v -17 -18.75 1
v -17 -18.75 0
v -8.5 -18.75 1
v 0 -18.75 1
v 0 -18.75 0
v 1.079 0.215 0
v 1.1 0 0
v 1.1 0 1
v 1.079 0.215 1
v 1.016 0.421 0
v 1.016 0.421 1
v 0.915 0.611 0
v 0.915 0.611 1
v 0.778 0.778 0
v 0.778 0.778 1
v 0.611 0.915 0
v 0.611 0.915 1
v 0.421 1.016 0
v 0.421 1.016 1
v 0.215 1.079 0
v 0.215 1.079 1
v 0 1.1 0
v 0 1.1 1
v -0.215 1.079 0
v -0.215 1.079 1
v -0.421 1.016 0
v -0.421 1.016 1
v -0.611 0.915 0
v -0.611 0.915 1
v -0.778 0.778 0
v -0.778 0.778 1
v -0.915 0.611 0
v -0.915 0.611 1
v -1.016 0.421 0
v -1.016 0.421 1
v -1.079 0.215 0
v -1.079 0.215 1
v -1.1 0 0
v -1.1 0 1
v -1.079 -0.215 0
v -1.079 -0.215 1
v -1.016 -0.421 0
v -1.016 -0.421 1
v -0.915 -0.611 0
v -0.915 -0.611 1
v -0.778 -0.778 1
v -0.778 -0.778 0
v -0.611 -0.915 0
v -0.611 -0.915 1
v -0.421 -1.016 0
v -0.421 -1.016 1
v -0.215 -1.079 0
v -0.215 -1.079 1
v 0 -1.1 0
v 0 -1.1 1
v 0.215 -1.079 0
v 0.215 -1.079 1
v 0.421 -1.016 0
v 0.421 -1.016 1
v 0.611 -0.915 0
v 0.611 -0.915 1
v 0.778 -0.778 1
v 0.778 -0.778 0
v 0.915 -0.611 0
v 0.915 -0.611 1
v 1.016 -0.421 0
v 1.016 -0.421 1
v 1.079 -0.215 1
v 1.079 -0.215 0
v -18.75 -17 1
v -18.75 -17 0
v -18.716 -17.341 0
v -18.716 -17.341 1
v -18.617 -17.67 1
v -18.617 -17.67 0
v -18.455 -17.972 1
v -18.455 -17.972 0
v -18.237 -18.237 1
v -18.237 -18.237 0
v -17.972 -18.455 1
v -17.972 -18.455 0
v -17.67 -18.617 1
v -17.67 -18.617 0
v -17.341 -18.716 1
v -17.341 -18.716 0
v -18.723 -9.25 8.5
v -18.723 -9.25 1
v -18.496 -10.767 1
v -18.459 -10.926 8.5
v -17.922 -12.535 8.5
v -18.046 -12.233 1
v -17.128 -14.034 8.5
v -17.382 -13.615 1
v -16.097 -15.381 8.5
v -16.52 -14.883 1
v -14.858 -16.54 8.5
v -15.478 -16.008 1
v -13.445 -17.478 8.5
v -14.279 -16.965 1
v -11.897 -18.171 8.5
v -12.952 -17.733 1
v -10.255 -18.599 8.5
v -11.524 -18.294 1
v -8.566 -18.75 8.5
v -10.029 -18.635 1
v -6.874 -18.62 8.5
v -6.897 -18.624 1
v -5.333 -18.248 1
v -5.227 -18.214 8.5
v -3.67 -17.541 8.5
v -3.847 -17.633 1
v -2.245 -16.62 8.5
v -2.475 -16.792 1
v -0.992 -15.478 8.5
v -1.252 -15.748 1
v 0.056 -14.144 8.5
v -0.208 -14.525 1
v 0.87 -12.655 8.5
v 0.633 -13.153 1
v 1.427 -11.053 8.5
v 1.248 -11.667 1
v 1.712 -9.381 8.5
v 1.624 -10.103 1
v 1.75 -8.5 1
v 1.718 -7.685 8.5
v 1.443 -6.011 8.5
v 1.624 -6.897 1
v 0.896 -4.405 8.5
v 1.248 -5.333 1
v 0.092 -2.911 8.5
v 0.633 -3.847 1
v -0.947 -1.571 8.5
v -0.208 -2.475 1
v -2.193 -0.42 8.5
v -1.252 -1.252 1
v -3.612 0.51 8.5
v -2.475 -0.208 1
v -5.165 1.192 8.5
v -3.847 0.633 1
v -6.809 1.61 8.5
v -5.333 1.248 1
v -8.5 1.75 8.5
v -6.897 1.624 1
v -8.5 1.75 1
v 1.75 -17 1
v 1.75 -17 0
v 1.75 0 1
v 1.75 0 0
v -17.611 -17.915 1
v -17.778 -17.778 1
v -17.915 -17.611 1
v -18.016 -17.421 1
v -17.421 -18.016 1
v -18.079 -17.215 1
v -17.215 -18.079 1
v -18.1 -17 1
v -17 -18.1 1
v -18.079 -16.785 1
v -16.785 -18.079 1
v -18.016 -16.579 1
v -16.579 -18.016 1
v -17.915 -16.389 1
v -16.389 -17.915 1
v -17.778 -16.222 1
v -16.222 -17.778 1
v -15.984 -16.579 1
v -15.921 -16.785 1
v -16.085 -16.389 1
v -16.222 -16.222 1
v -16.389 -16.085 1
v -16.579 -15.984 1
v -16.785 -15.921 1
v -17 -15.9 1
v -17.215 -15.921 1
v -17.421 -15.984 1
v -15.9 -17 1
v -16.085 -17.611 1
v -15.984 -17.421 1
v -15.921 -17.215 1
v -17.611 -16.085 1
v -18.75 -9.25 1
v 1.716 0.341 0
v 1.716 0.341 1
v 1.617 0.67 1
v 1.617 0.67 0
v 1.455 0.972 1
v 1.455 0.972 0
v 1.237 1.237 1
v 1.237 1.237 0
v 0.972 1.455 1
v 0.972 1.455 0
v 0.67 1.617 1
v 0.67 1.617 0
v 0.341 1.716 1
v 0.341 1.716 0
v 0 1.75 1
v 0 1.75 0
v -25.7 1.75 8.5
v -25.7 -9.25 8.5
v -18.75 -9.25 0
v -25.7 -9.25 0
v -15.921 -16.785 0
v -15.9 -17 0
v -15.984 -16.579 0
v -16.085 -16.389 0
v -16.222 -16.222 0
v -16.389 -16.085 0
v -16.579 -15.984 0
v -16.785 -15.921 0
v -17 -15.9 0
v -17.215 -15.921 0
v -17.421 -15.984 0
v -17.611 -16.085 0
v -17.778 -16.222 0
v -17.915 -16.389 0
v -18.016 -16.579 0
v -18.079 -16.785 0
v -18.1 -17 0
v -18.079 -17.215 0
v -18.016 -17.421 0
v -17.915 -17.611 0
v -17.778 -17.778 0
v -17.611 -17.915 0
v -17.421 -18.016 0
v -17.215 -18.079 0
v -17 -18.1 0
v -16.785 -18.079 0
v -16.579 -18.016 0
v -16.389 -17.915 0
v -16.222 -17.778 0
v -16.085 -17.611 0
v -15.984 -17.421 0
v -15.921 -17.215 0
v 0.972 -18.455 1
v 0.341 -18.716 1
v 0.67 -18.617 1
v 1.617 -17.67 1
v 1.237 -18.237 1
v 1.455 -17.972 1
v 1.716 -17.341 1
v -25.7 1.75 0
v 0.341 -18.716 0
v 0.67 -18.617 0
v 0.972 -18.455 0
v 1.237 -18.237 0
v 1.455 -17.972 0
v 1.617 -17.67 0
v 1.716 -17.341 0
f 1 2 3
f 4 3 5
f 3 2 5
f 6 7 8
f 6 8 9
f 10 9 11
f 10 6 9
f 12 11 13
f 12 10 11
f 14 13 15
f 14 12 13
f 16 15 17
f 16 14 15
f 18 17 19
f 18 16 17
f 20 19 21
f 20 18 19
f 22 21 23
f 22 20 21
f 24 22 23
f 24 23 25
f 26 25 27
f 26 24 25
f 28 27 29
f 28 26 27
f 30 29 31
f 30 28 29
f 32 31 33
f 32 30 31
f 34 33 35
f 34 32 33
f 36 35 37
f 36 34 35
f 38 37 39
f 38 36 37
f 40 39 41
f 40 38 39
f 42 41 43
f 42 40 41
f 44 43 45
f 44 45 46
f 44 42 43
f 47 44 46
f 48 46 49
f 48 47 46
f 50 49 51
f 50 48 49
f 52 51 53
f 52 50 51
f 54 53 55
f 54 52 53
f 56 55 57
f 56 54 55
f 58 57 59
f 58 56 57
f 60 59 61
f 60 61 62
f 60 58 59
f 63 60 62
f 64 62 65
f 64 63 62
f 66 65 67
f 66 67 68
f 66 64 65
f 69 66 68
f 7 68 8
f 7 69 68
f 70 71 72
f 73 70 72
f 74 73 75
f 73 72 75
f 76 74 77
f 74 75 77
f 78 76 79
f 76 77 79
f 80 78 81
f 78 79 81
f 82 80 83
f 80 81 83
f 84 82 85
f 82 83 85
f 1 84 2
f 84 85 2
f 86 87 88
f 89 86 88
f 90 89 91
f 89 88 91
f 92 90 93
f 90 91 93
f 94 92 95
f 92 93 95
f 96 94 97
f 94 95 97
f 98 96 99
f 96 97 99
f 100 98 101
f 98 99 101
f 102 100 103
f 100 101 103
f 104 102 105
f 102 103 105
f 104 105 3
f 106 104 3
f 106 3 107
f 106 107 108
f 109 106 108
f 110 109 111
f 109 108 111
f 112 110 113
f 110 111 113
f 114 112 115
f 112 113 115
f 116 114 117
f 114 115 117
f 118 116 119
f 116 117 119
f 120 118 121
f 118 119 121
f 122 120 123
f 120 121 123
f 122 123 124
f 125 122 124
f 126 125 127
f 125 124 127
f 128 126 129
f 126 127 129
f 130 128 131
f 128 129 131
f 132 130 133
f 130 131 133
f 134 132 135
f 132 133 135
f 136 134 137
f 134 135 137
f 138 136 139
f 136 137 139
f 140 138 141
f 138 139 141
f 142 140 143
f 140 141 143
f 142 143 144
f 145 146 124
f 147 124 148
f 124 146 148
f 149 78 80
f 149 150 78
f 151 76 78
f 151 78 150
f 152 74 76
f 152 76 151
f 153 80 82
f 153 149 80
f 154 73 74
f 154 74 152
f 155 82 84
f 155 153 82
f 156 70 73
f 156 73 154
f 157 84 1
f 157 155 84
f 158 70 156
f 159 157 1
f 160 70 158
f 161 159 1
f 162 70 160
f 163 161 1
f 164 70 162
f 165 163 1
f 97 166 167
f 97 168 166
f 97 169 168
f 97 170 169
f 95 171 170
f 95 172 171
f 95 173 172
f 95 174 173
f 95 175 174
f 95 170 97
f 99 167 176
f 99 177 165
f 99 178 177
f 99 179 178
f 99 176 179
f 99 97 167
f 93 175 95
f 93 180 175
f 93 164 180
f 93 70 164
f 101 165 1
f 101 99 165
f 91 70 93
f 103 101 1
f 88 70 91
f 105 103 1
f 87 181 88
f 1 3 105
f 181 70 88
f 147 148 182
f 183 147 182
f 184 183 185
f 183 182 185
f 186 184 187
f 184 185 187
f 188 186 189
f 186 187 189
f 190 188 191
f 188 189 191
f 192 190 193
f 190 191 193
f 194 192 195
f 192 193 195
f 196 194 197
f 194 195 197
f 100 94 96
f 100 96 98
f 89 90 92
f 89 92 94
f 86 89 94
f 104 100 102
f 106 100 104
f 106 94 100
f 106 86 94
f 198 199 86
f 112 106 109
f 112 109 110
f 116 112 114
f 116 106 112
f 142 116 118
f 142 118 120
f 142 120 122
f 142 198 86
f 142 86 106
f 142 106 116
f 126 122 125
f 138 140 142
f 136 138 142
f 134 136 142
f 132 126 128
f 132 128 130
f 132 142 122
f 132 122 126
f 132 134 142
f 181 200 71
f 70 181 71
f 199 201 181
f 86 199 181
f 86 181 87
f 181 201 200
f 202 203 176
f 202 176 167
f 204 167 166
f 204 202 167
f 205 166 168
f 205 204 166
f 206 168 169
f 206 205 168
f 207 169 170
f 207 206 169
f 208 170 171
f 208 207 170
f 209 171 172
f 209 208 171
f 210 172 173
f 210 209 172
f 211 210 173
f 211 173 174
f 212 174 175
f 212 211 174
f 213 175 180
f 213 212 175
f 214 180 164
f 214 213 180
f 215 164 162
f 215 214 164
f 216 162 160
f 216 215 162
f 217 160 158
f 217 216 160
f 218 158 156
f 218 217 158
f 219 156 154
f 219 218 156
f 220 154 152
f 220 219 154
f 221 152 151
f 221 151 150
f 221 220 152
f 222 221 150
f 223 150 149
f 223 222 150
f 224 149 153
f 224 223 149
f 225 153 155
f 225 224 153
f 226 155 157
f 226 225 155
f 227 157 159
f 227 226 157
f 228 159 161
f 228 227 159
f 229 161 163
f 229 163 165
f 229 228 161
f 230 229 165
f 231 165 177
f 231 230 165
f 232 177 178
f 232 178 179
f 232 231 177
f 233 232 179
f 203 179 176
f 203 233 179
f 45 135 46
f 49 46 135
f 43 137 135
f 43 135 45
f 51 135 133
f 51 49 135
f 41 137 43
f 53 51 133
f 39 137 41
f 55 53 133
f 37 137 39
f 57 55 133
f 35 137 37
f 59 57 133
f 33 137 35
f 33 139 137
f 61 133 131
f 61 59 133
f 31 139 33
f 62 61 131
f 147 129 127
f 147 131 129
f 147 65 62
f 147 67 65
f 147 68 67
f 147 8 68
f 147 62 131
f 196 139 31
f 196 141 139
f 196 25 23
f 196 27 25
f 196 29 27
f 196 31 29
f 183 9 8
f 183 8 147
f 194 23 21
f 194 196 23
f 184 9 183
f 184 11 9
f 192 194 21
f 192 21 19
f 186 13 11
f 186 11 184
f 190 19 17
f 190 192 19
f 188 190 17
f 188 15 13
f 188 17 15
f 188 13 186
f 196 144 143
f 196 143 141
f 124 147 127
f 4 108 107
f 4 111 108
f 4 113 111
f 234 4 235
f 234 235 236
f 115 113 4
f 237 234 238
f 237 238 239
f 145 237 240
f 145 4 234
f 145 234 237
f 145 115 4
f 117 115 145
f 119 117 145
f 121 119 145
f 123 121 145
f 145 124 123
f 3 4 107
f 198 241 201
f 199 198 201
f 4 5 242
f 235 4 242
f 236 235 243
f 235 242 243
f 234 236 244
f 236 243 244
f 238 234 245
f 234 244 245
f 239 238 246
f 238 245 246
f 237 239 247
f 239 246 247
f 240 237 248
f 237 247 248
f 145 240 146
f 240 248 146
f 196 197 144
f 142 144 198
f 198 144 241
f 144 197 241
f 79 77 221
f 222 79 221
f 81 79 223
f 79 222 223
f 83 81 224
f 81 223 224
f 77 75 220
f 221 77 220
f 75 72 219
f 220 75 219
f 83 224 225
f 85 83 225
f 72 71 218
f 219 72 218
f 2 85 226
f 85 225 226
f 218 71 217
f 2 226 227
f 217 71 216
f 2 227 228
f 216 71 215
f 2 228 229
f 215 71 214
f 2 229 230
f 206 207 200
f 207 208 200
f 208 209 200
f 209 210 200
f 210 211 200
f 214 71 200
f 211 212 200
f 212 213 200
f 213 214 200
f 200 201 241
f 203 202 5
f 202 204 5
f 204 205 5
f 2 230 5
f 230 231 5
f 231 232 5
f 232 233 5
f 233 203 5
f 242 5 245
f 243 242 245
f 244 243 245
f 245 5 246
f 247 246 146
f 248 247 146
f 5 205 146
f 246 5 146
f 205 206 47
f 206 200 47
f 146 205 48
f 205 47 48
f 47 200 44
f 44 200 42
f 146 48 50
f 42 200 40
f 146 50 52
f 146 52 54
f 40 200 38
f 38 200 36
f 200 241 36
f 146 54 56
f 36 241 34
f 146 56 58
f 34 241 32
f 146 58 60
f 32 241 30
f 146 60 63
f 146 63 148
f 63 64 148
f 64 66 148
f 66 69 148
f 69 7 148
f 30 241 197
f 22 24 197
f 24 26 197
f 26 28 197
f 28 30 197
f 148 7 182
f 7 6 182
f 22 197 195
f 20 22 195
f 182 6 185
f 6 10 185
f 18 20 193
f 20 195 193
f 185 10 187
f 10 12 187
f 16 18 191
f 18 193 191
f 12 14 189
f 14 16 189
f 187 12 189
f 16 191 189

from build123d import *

# Parameters (mm, degrees)
SKETCH1_R           = 1.1
BOSS_EXTRUDE1_DEPTH = 1
BOSS_EXTRUDE2_DEPTH = 7.5


with BuildPart() as part:
    # Sketch1 → Boss-Extrude1 (new body)
    with BuildSketch(Plane.XY):
        with BuildLine():
            Line((0, 1.75), (-25.7, 1.75))
            Line((-25.7, 1.75), (-25.7, -9.25))
            Line((-25.7, -9.25), (-18.75, -9.25))
            Line((-18.75, -9.25), (-18.75, -17))
            ThreePointArc((-18.75, -17), (-18.237436867, -18.237436867), (-17, -18.75))
            Line((-17, -18.75), (0, -18.75))
            ThreePointArc((0, -18.75), (1.237436867, -18.237436867), (1.75, -17))
            Line((1.75, -17), (1.75, 0))
            ThreePointArc((1.75, 0), (1.237436867, 1.237436867), (0, 1.75))
        make_face()
        Circle(SKETCH1_R, mode=Mode.SUBTRACT)
        with Locations((-17, -17)):
            Circle(SKETCH1_R, mode=Mode.SUBTRACT)
    extrude(amount=BOSS_EXTRUDE1_DEPTH)

    # Sketch2 → Boss-Extrude2 (add)
    with BuildSketch(Plane.XY.offset(1)):
        with BuildLine():
            Line((-25.7, -9.25), (-18.72252415, -9.25))
            ThreePointArc((-18.72252415, -9.25), (-0.991671291, -15.477642868), (-8.5, 1.75))
            Line((-8.5, 1.75), (-25.7, 1.75))
            Line((-25.7, 1.75), (-25.7, -9.25))
        make_face()
    extrude(amount=BOSS_EXTRUDE2_DEPTH)


solid = part.part
